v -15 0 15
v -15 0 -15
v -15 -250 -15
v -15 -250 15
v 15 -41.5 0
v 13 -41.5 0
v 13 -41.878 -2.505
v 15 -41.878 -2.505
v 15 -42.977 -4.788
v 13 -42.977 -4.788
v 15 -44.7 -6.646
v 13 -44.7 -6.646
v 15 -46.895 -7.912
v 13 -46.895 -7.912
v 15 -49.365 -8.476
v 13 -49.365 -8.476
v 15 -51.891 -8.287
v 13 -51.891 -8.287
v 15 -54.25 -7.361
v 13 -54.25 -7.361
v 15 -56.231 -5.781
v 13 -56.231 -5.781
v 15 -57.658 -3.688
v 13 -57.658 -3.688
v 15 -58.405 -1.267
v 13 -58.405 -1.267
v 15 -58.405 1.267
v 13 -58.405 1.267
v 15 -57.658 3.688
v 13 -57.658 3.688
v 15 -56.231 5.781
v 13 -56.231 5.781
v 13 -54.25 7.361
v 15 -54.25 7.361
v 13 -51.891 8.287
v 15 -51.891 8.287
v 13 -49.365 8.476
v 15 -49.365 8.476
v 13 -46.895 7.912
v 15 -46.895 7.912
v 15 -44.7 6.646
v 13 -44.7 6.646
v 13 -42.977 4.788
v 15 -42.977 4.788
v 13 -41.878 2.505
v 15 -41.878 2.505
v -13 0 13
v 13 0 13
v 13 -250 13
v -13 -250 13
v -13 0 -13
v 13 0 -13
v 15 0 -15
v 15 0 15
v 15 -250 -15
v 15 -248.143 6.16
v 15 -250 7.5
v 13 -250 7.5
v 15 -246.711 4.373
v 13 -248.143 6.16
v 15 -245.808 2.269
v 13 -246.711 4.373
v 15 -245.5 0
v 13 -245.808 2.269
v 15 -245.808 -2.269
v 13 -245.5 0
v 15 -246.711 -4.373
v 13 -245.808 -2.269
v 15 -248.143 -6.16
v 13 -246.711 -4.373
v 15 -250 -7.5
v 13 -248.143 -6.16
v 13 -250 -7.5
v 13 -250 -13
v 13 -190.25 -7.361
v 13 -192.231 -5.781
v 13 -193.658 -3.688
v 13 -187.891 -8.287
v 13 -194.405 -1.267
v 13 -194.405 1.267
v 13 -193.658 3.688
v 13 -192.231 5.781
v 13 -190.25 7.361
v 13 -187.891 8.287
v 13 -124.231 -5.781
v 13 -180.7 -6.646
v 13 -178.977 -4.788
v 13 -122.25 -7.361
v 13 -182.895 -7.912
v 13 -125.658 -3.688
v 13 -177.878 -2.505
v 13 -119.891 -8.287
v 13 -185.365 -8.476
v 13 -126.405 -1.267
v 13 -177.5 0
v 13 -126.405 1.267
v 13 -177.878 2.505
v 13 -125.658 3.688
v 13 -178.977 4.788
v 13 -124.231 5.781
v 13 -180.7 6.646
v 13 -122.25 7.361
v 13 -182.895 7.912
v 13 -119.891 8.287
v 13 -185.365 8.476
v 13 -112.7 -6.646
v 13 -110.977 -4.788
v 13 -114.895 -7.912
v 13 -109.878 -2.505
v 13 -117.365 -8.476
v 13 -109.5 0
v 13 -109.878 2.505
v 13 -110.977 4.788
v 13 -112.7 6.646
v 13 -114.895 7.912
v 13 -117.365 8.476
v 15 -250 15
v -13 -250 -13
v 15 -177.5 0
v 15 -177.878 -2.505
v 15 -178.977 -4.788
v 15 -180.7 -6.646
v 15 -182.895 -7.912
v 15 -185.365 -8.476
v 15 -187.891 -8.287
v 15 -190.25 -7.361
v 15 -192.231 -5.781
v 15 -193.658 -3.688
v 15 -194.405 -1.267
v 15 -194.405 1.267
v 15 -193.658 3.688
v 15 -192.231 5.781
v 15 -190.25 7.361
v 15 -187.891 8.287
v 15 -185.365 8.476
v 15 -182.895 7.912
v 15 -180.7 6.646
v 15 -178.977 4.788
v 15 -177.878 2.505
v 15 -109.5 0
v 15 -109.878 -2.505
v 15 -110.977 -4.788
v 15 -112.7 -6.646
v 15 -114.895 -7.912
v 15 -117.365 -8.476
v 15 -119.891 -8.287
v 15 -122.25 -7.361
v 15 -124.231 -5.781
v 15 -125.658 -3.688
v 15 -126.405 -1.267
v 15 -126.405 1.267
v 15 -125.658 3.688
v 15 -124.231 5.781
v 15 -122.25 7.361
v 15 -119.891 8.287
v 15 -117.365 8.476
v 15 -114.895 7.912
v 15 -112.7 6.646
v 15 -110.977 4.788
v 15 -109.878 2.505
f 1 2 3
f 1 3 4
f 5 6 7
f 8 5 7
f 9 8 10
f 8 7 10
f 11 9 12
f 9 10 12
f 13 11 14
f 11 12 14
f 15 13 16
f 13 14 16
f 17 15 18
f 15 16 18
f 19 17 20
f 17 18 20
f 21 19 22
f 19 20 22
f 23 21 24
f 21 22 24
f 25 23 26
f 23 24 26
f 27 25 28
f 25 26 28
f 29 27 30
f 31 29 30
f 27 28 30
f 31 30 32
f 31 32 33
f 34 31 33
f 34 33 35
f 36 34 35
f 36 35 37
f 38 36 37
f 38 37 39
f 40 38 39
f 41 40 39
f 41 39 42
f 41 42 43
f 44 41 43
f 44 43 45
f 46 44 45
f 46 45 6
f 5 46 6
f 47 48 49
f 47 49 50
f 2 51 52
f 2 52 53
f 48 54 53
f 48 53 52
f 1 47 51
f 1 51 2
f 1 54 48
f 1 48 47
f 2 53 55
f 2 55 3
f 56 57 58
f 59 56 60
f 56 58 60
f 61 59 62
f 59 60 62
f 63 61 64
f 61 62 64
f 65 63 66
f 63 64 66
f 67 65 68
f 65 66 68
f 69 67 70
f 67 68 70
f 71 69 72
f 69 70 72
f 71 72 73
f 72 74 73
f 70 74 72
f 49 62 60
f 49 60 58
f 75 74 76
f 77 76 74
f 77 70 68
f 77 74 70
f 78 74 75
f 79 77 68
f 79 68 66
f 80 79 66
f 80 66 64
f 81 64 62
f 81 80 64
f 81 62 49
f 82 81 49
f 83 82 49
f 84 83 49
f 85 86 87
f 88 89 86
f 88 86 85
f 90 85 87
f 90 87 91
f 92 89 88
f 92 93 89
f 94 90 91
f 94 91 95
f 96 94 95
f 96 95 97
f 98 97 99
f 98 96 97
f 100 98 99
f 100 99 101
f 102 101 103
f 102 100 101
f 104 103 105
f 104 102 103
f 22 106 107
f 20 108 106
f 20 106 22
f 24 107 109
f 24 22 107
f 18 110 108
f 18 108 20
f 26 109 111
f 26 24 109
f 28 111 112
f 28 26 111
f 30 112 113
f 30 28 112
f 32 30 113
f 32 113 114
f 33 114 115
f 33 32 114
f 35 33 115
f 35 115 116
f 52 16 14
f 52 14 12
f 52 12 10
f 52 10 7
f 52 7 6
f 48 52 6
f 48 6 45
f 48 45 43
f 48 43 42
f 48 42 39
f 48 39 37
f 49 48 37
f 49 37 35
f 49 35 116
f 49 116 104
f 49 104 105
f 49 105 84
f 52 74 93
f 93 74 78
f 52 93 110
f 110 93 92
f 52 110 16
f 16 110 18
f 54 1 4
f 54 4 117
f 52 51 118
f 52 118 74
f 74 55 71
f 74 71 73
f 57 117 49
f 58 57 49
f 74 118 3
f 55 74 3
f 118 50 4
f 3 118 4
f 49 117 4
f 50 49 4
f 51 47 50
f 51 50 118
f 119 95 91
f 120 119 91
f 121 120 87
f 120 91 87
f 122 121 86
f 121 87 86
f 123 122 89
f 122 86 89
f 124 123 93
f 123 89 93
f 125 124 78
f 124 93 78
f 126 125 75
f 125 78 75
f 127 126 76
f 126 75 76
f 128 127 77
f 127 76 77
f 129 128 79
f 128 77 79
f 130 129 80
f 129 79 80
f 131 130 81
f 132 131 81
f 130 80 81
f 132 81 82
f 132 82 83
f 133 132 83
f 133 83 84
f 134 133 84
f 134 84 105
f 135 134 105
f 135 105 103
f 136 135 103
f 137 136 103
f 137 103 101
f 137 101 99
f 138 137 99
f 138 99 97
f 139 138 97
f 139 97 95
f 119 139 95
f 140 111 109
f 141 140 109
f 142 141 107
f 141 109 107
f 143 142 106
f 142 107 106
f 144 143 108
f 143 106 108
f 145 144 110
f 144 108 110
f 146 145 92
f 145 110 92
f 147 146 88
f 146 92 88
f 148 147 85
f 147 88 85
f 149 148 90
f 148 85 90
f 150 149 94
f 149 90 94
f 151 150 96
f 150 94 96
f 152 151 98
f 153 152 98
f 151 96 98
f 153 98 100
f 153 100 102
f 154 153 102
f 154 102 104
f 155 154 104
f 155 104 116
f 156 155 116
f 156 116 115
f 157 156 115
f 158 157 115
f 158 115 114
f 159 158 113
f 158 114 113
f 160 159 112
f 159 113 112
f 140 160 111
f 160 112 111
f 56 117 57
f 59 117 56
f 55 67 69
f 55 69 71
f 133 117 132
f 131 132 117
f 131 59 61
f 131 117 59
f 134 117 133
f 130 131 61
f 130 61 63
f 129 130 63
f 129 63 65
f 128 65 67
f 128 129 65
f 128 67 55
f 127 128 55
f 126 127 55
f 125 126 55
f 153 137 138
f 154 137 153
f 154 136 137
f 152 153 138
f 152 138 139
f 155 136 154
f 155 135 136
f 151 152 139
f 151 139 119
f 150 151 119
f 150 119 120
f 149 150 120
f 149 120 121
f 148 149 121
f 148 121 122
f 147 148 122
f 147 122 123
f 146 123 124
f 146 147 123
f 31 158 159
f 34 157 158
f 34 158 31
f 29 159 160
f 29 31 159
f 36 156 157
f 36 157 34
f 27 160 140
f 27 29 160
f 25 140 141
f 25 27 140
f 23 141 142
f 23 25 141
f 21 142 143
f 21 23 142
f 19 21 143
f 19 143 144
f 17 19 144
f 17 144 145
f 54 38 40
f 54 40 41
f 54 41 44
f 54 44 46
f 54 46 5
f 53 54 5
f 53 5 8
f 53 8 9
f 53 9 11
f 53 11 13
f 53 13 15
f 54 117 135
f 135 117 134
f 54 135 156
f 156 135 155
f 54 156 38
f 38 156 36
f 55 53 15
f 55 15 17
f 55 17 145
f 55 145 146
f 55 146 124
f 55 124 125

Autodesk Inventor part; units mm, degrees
ref_plane "YZ Plane" through (0, 0, 0) normal (1, 0, 0) x (0, 1, 0)
ref_plane "XZ Plane" through (0, 0, 0) normal (0, 1, 0) x (-1, 0, 0)
ref_plane "XY Plane" through (0, 0, 0) normal (0, 0, 1) x (1, 0, 0)
sketch "Sketch9" plane through (0, 0, 0) normal (0, 1, 0) x (-1, 0, 0)
  line L0 (15, 15) -> (-15, 15)
  line L1 (-15, 15) -> (-15, -15)
  line L2 (-15, -15) -> (15, -15)
  line L3 (15, -15) -> (15, 15)
  line L4 (15, 15) -> (-15, -15) construction
  line L5 (-15, 15) -> (15, -15) construction
  line L6 (-13, 13) -> (13, 13)
  line L7 (13, 13) -> (13, -13)
  line L8 (13, -13) -> (-13, -13)
  line L9 (-13, -13) -> (-13, 13)
  point P0 (0, 0)
  dimension "d172" = 30
  dimension "d173" = 30
  dimension "d174" = 2
extrude "Extrusion3" add sketch "Sketch9" against normal blind 250
sketch "Sketch10" plane through (0, 0, 0) normal (1, 0, 0) x (0, 1, 0)
  line L0 (0, 15) -> (0, -15) construction
  line L1 (0, 15) -> (-250, 15) construction
  line L2 (0, -15) -> (-250, -15) construction
  line L3 (-58.5, 8.5) -> (-41.5, 8.5)
  line L4 (-41.5, 8.5) -> (-41.5, -8.5)
  line L5 (-41.5, -8.5) -> (-58.5, -8.5)
  line L6 (-58.5, -8.5) -> (-58.5, 8.5)
  line L7 (-58.5, 8.5) -> (-41.5, -8.5) construction
  line L8 (-41.5, 8.5) -> (-58.5, -8.5) construction
  line L9 (0, 0) -> (30, 0)
  circle A0 centre (-50, 0) radius 8.5
  dimension "d177" = 17
  dimension "d178" = 17
  dimension "d181" = 30
  dimension "d182" = 80
extrude "Extrusion4" cut sketch "Sketch10" along normal through all contours A0
pattern_linear "Rectangular Pattern4" count 4 spacing 68 along (0, -1, 0) of "Extrusion4"
properties part number "PRS 1662 FDS 1000 way tube 4_D940" material "Stainless Steel"
